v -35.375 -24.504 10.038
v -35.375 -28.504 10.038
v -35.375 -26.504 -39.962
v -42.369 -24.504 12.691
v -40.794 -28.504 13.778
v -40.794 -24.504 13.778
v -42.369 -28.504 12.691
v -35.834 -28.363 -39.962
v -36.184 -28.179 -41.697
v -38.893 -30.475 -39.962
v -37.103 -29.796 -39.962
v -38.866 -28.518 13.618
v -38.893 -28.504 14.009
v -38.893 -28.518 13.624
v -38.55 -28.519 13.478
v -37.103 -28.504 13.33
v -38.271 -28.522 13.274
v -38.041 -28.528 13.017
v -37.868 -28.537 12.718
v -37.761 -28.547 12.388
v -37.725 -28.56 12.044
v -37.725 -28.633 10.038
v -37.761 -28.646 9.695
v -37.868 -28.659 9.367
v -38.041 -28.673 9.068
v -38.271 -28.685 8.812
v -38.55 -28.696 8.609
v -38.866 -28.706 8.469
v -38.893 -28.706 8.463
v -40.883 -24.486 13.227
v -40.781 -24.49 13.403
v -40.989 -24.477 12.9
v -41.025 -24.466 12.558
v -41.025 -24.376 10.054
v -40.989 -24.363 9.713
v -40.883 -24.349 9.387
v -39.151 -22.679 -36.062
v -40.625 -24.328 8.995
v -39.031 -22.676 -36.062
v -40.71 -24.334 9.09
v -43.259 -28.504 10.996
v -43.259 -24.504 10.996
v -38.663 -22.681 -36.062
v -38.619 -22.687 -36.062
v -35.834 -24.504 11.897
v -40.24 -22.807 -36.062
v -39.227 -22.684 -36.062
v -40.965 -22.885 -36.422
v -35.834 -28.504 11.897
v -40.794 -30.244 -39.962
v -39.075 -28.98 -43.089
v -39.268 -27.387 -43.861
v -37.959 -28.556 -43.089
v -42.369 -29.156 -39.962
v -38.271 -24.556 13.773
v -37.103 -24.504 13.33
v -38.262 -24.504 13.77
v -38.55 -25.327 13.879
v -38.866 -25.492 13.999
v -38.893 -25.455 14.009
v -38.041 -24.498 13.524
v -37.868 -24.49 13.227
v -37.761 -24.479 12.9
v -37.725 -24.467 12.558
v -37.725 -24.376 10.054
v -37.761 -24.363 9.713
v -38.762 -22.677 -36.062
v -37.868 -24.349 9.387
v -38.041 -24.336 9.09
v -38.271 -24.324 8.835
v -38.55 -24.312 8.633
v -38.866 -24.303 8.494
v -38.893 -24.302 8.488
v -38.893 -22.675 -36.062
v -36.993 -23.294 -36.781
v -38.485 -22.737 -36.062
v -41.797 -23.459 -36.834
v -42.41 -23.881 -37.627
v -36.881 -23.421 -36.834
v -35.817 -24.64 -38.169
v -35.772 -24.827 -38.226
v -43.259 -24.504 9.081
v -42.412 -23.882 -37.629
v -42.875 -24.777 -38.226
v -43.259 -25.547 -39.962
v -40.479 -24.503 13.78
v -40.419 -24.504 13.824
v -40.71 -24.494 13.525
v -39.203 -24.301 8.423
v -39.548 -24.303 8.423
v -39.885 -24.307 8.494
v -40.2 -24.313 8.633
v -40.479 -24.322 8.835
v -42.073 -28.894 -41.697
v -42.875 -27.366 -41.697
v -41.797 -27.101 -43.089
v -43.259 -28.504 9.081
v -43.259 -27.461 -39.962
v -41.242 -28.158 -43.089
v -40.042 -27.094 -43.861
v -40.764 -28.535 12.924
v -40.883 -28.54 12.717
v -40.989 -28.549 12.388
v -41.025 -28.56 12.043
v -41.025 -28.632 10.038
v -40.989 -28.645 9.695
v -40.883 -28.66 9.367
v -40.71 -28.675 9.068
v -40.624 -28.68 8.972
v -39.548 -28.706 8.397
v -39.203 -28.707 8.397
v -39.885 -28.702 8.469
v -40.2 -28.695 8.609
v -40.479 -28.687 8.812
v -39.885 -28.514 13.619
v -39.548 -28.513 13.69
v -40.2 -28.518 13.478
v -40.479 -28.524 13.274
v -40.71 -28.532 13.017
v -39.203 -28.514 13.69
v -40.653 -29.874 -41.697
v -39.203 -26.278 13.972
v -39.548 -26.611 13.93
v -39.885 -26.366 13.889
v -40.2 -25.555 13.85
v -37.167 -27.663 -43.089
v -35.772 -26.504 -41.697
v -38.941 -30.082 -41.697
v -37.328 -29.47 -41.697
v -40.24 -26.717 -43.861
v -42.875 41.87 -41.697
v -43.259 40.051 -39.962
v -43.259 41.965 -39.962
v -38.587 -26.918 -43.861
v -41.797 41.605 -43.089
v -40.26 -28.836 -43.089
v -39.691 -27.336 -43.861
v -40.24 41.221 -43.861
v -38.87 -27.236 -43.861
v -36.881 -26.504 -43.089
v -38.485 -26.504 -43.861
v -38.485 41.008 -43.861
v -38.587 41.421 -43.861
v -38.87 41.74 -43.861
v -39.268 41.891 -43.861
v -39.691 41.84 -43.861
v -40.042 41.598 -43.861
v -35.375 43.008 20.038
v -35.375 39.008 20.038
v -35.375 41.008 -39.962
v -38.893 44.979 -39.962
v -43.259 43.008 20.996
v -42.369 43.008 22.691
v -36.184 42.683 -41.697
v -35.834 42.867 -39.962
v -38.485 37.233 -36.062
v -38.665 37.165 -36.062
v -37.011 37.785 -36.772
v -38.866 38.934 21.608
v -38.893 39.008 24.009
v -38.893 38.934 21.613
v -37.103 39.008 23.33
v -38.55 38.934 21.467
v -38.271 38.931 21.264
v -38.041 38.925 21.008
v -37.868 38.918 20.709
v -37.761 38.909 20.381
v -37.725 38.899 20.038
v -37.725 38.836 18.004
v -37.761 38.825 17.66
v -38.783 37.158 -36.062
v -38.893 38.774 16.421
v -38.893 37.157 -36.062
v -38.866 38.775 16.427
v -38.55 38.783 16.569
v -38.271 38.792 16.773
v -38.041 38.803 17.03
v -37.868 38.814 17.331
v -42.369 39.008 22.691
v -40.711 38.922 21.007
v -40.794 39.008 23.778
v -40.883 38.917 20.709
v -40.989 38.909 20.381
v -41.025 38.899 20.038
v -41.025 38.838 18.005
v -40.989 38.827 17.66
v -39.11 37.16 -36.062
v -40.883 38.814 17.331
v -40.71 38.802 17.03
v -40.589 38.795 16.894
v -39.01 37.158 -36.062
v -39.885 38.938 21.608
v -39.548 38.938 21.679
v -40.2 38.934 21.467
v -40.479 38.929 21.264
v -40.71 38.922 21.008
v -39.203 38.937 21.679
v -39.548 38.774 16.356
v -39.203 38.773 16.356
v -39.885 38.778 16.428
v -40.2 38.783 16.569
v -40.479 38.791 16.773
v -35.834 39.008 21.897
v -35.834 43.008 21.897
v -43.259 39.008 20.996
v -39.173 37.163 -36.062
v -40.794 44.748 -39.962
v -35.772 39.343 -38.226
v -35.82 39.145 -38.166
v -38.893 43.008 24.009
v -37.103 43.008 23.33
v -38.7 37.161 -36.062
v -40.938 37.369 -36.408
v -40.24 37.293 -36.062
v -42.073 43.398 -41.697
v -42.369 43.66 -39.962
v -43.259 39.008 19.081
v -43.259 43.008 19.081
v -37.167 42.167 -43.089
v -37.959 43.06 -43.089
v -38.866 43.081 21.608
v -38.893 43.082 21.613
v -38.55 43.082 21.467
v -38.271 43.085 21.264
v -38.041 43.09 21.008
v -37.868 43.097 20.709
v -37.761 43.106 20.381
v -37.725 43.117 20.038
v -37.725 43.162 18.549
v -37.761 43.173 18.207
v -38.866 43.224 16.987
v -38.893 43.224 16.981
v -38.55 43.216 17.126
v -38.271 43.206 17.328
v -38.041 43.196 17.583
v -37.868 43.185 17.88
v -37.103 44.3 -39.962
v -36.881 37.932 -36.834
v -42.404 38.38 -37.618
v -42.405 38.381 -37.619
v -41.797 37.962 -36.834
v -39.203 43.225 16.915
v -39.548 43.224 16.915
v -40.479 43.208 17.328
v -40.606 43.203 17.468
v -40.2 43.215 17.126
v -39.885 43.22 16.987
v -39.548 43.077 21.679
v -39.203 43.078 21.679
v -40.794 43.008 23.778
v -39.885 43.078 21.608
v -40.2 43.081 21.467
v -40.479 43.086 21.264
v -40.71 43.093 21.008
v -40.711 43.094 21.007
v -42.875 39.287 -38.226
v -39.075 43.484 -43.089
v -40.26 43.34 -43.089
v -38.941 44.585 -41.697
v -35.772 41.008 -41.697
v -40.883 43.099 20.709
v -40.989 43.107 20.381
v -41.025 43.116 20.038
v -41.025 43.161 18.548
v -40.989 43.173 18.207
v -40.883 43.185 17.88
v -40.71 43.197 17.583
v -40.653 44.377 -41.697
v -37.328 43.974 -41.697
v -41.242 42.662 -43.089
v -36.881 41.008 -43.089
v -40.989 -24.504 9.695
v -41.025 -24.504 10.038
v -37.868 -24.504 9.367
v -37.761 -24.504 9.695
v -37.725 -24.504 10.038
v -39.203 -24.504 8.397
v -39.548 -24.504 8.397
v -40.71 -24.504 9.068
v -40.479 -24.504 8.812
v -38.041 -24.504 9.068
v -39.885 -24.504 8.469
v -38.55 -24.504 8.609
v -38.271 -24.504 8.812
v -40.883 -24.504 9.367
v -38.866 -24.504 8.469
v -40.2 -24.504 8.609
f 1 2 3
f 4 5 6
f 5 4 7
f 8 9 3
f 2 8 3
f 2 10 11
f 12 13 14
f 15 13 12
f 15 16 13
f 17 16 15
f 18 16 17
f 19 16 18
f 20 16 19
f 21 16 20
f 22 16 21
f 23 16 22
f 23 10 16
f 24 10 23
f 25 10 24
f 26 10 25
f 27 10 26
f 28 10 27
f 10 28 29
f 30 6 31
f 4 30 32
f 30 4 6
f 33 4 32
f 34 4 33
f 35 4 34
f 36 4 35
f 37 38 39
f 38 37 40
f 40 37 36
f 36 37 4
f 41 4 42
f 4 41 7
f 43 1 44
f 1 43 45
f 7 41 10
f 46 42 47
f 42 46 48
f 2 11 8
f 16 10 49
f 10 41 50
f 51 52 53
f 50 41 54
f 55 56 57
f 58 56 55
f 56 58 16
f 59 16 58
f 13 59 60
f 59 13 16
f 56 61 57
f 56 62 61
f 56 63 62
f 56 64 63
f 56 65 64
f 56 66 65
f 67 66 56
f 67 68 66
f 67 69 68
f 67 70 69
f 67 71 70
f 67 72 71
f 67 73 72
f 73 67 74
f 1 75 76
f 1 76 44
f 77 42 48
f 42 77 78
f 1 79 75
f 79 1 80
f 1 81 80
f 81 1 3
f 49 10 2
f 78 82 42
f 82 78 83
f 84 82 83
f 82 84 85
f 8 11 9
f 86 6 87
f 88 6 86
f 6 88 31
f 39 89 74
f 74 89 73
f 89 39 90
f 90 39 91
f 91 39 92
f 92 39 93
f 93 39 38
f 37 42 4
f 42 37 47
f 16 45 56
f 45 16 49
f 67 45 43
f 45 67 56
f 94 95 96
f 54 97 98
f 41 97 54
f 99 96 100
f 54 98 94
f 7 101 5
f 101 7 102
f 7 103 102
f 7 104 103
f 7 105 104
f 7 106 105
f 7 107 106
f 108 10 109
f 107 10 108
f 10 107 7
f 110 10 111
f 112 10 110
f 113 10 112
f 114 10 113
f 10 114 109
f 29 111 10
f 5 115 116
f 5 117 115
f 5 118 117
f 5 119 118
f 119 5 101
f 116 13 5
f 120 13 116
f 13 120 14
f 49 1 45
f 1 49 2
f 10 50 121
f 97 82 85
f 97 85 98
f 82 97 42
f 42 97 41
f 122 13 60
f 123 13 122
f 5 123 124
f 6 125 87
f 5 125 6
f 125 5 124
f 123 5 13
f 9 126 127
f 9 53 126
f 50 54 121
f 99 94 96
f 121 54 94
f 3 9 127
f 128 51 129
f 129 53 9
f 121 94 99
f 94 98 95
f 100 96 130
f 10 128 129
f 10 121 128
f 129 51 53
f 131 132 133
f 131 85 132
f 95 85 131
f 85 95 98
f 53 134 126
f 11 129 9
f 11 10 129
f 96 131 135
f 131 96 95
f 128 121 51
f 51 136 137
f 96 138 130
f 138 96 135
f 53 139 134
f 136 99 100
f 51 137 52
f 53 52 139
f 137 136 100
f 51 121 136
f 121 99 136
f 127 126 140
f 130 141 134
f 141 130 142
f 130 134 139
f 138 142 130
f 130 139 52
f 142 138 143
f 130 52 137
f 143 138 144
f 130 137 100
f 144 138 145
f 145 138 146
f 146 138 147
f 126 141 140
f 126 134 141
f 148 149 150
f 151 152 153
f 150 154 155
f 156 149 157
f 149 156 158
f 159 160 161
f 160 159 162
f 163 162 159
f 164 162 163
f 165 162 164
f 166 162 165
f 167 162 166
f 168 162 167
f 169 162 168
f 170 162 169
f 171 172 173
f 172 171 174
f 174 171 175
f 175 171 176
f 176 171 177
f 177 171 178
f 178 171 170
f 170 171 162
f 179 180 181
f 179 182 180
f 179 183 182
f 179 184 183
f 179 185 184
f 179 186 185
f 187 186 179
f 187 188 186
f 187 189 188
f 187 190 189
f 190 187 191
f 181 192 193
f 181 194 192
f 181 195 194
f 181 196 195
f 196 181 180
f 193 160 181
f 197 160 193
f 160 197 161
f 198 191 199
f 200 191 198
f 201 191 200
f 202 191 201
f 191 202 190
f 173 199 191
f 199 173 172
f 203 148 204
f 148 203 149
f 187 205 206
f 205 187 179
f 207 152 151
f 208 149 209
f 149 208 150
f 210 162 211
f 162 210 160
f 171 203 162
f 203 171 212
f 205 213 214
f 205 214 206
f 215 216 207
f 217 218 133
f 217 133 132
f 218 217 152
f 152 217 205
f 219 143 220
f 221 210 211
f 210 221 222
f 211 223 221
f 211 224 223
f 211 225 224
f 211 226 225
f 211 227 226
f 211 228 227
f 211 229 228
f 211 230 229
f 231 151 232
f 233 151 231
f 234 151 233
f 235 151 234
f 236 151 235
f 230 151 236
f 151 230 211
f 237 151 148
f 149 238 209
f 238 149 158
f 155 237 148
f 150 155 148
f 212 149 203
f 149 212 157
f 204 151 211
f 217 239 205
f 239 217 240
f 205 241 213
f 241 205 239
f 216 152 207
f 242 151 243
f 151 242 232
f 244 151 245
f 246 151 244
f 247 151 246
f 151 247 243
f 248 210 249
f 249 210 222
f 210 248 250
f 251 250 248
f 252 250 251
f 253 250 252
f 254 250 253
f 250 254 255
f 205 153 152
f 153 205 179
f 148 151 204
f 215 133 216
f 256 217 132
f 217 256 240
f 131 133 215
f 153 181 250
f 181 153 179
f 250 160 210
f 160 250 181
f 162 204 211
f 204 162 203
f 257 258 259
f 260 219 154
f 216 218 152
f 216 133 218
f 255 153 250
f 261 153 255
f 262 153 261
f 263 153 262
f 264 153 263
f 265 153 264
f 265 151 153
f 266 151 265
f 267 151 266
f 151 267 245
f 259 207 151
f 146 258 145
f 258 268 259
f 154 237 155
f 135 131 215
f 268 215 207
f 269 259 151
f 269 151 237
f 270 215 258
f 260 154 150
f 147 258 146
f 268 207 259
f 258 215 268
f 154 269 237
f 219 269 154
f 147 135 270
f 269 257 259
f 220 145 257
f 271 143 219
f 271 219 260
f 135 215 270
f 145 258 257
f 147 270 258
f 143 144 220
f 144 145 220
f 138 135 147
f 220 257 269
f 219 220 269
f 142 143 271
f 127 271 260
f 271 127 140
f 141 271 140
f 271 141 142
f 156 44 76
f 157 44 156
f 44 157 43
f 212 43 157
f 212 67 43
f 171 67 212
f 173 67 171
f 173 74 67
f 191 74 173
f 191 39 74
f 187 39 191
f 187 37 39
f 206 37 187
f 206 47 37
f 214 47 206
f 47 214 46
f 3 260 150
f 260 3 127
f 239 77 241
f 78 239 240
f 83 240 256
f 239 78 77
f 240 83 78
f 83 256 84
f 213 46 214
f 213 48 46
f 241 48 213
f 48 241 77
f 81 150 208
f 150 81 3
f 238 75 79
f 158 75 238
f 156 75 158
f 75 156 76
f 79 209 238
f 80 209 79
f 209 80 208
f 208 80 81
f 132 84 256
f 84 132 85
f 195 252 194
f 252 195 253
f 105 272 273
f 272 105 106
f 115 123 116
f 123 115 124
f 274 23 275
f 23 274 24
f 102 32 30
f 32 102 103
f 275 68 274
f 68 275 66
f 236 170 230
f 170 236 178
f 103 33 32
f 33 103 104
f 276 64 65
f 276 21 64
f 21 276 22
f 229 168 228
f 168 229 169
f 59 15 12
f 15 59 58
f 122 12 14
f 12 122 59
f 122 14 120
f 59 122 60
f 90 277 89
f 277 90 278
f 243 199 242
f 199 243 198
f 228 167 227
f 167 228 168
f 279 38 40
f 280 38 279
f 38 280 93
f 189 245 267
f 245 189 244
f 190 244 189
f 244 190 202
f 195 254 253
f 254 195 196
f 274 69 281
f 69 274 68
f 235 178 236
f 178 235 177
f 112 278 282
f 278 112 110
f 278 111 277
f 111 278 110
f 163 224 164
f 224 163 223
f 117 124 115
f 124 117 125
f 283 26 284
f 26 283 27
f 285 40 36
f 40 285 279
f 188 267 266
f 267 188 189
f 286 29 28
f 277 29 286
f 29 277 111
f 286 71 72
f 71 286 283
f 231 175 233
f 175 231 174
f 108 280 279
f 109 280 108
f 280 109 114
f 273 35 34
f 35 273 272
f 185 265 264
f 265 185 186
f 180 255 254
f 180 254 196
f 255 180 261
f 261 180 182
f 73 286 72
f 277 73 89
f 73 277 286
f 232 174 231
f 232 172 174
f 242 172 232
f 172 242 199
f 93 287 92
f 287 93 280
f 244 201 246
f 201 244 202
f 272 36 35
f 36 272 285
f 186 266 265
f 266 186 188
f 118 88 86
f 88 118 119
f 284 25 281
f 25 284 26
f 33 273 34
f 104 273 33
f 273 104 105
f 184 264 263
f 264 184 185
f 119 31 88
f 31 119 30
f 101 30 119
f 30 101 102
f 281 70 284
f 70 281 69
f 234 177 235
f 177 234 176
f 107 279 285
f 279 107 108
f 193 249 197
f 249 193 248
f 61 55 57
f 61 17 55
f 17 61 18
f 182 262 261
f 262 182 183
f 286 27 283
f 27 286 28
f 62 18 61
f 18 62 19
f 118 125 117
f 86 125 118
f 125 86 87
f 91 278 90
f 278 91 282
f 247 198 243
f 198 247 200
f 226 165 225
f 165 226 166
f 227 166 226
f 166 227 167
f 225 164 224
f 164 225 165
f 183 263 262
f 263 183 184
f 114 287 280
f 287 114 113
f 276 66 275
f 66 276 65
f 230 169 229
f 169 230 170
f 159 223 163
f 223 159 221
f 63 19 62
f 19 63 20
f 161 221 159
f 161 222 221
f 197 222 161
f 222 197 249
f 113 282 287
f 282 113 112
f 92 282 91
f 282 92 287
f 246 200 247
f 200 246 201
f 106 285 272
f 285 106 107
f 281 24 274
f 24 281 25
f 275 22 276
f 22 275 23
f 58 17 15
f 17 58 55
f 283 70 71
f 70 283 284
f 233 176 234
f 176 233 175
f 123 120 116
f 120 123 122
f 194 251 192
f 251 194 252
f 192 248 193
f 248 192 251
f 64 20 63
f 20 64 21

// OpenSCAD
difference () {
  union () {
    hull () {
      translate ([0, 8, 0]) {
        translate ([-39.37541674104513, -34.50390561348755, 10.038272992958468]) {
          rotate (a=90.0, v=[1, 0, 0]) {
            cylinder (h=4, r=4, center=true);
          }
        }
      }
      translate ([0, 8, -50]) {
        translate ([-39.37541674104513, -34.50390561348755, 10.038272992958468]) {
          sphere (r=4);
        }
      }
    }
    hull () {
      translate ([0, -4, 0]) {
        translate ([-39.37541674104513, 45.007811226975086, 20.03827299295847]) {
          rotate (a=90.0, v=[1, 0, 0]) {
            cylinder (h=4, r=4, center=true);
          }
        }
      }
      translate ([0, -4, -60]) {
        translate ([-39.37541674104513, 45.007811226975086, 20.03827299295847]) {
          sphere (r=4);
        }
      }
    }
    hull () {
      translate ([0, 8, -50]) {
        translate ([-39.37541674104513, -34.50390561348755, 10.038272992958468]) {
          sphere (r=4);
        }
      }
      translate ([0, -4, -60]) {
        translate ([-39.37541674104513, 45.007811226975086, 20.03827299295847]) {
          sphere (r=4);
        }
      }
    }
  }
  hull () {
    translate ([-39.37541674104513, 45.007811226975086, 20.03827299295847]) {
      rotate (a=90.0, v=[1, 0, 0]) {
        cylinder ($fn=30, h=20, r=1.65, center=true);
      }
    }
    translate ([-39.37541674104513, -34.50390561348755, 10.038272992958468]) {
      rotate (a=90.0, v=[1, 0, 0]) {
        cylinder ($fn=30, h=20, r=1.65, center=true);
      }
    }
  }
}
